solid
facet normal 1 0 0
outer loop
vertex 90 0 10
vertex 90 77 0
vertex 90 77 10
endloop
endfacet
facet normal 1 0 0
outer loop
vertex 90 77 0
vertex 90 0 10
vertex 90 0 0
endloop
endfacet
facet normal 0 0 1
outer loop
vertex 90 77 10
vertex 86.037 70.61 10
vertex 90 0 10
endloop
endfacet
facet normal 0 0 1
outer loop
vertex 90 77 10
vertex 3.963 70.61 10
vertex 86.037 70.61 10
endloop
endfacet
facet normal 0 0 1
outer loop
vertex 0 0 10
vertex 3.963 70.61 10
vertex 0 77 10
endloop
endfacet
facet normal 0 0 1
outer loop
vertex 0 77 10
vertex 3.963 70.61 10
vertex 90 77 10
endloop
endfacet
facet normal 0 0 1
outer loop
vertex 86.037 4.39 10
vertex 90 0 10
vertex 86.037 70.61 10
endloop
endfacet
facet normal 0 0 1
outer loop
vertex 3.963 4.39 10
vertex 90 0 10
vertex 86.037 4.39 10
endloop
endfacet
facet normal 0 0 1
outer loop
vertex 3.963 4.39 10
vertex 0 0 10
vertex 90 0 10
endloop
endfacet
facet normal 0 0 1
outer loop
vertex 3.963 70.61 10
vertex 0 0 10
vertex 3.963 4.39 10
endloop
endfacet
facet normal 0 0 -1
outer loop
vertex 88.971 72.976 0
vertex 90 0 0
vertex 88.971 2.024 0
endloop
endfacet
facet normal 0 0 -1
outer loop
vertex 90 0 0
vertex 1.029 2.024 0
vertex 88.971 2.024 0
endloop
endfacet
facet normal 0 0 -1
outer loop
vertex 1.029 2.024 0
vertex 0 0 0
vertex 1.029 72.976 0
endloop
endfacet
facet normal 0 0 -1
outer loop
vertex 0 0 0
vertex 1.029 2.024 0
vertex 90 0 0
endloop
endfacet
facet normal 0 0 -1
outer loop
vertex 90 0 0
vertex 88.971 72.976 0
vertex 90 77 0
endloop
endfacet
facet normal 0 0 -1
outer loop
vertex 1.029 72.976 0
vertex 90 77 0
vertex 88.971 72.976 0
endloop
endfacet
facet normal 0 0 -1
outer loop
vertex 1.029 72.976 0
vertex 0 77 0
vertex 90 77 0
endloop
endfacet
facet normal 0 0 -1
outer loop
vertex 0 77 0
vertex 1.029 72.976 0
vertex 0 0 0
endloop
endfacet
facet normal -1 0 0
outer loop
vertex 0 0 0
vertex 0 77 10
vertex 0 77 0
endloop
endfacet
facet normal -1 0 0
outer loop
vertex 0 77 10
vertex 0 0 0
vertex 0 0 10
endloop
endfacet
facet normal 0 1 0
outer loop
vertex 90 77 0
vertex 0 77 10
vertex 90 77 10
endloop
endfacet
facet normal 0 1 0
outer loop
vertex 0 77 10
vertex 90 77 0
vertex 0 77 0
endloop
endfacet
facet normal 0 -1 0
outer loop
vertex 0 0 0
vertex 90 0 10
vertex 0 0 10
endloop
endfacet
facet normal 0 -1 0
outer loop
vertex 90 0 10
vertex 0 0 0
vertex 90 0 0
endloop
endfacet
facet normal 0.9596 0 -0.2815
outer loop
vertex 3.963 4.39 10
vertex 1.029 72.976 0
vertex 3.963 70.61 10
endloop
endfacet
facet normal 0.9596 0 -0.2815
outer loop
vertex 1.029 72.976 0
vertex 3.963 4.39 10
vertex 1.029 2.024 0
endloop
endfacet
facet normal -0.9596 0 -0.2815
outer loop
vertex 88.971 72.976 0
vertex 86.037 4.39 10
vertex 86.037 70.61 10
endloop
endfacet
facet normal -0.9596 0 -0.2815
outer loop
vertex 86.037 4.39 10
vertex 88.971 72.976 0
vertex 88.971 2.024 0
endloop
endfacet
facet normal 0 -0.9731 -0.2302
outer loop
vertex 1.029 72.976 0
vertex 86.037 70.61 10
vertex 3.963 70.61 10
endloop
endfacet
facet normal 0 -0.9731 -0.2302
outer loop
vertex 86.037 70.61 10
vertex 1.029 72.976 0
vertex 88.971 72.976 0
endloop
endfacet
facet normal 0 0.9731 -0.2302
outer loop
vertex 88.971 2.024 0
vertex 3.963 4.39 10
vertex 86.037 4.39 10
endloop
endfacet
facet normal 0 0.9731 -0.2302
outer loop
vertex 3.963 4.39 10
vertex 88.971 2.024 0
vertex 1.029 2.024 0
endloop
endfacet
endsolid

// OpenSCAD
$fa = 1;
$fs = 0.5;
$fn = 200;

difference() {
  cube([90,77,10]);
  translate([90/2,77/2-1,-0.1])
    linear_extrude(height=12,convexity=10,scale=0.92)
      square([90-2,77-6],center=true);
}
